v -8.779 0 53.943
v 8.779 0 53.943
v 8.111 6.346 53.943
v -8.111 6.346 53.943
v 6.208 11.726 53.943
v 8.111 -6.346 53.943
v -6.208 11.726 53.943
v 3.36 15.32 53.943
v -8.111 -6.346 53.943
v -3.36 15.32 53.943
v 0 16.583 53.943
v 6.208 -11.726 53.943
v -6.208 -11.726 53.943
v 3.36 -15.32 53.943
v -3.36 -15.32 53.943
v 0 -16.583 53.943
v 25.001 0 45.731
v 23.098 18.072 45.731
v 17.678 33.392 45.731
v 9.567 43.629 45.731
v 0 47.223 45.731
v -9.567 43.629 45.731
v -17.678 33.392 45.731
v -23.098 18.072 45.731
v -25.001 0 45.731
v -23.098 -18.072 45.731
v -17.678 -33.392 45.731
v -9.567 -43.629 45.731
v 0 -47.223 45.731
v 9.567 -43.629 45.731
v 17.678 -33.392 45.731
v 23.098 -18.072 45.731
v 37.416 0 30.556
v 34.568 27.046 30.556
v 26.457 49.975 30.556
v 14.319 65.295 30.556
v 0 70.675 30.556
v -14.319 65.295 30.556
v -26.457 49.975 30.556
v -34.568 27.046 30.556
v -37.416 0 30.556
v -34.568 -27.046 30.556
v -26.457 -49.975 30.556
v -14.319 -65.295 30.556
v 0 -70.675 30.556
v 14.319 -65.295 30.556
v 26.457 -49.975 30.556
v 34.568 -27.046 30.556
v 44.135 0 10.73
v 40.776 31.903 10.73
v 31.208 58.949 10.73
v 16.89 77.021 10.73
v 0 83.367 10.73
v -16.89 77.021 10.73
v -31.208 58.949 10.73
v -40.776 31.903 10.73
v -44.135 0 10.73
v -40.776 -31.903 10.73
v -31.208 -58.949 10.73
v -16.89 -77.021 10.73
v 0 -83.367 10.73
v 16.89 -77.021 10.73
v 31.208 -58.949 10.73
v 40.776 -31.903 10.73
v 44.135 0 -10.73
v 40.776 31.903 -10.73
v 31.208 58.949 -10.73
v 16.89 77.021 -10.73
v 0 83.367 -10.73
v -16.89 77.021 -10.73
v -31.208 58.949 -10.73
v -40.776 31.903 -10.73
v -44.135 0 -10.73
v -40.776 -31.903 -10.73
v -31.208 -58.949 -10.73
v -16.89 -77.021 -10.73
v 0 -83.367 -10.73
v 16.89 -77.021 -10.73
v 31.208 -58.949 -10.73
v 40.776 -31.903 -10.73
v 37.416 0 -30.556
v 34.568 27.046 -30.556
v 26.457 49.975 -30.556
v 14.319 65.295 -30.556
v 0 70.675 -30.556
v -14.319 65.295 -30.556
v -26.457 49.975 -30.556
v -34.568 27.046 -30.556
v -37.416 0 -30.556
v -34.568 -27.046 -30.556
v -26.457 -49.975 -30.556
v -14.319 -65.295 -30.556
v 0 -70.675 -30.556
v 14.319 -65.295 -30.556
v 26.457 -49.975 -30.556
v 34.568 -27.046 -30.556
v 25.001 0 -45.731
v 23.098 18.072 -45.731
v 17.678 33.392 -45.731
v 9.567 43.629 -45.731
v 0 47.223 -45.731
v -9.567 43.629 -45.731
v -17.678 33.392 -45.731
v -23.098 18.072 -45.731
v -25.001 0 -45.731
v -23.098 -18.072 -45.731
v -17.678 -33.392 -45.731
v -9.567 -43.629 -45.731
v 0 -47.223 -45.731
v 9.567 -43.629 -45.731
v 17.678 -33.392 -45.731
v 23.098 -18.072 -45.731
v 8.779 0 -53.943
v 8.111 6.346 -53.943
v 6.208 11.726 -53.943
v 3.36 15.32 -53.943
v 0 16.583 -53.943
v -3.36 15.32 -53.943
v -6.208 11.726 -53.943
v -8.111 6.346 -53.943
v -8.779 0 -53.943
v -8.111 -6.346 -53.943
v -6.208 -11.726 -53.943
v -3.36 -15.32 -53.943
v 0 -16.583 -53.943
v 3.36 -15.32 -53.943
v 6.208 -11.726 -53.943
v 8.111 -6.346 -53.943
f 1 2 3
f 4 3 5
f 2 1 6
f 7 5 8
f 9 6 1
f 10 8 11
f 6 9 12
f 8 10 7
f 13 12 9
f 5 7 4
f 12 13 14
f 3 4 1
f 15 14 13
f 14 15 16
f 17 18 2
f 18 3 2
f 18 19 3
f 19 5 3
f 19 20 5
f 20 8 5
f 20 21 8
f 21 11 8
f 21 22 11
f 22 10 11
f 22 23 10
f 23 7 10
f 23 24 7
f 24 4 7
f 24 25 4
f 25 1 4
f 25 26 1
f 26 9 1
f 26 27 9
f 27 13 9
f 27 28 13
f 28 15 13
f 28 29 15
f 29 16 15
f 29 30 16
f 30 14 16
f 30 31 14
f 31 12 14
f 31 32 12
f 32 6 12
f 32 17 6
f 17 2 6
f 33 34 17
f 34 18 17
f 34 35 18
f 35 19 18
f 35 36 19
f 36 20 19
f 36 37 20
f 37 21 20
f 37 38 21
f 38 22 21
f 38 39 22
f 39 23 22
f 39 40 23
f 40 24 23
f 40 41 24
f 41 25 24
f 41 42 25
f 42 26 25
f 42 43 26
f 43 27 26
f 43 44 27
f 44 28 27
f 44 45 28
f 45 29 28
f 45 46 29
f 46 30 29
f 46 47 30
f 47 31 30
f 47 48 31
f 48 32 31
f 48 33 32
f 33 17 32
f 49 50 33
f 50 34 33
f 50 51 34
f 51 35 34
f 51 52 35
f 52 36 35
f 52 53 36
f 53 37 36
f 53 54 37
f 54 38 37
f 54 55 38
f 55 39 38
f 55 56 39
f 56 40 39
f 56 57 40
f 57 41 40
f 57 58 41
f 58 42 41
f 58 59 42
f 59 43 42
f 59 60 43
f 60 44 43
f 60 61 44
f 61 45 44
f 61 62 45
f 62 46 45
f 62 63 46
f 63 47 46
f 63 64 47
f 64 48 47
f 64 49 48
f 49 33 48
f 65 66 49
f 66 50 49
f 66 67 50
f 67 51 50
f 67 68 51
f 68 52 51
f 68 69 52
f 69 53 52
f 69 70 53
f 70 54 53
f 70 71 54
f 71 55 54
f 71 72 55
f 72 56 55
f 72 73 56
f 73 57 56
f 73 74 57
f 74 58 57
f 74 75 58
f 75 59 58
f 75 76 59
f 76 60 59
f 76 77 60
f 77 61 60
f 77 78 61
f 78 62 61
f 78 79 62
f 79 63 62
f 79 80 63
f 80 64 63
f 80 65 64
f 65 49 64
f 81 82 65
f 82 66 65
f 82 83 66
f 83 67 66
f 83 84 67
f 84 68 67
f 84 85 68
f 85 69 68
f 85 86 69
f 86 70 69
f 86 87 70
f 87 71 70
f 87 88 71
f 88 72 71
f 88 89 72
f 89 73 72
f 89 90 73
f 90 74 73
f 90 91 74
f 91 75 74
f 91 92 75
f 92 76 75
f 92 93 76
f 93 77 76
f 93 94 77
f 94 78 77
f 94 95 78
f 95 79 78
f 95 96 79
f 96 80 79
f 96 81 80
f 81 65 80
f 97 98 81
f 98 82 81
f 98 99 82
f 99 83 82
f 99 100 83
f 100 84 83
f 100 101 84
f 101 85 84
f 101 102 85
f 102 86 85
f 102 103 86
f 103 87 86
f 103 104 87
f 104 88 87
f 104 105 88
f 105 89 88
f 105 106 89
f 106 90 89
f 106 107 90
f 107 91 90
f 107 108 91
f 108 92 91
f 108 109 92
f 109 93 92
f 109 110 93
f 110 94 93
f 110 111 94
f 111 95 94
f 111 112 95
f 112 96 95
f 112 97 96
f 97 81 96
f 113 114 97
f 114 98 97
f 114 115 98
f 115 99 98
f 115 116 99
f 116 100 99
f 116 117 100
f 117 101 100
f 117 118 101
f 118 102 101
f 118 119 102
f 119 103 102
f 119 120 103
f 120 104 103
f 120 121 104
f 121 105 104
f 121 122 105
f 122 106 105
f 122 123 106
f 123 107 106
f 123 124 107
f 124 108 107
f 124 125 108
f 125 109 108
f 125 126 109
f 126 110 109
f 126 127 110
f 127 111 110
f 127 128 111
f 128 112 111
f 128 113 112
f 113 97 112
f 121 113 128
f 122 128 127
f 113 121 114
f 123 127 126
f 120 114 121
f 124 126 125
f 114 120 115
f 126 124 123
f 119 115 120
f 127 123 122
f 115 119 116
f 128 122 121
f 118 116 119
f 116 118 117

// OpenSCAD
// Generated by SolidPython 1.0.1 on 2020-07-29 00:46:49


scale(v = [9, 17, 11]) {
	sphere(r = 5);
}
/***********************************************
*********      SolidPython code:      **********
************************************************
 
# import packages: SolidPython
from solid import *
from solid.utils import *
from itertools import chain, combinations, permutations


class Resize:

    def __init__(self, scad_file):
        self.scad_file = scad_file
        #self.scad_file = import_scad(scad_file)
        # cone/cylinder param:
        self.r1 = 0
        self.r2 = 0
        self.h = 0
        # rectangular prism param:
        self.w = 0
        self.l = 0
        # ellipse param:
        self.r = 0

    # import OpenScad code (file name corresponds to shape)


    # classify shape + parameters
    def assign(self, param1, param2, param3):
        if self.scad_file == 'cone.scad':
            self.r1 = param1
            self.r2 = param2
            self.h = param3
        elif self.scad_file == 'cylinder.scad':
            self.r1 = param1
            self.r2 = param2
            self.h = param3
        elif self.scad_file == 'rectangularPrism.scad':
            self.h = param1
            self.l = param2
            self.w = param3
        else:
            self.r = param1
            self.h = param2

    # resize parameters
    def iterate(self):
        x = range(3, 20, 2)
        i = 1
        if self.scad_file == 'cone.scad':
            tempList = list(permutations(x, 2))
            for temp in tempList:
                param1 = temp[0]
                param2 = temp[1]
                filepath = 'produced_scad_files/' + 'cone' + str(param1) + '_' + str(param2) + '_' + '.scad'
                scad_render_to_file(cylinder(h=param1, r1=param2, r2=0), filepath)

        elif self.scad_file == 'cylinder.scad':
            tempList = list(permutations(x, 3))
            for temp in tempList:
                param1 = temp[0]
                param2 = temp[1]
                filepath = 'produced_scad_files/' + 'cylinder' + str(param1) + '_' + str(param2) + '_' + '.scad'
                scad_render_to_file(cylinder(h=param1, r1=param2, r2=param2), filepath)

        elif self.scad_file == 'rectangularPrism.scad':
            tempList = list(permutations(x, 3))
            for temp in tempList:
                param1 = temp[0]
                param2 = temp[1]
                param3 = temp[2]
                filepath = 'produced_scad_files/' + 'rectangularPrism' + str(param1) + '_' + str(param2) + '_' + str(
                    param3) + '.scad'
                scad_render_to_file(cube(size=(param1, param2, param3)), filepath)

        elif self.scad_file == 'ellipse.scad':
            tempList = list(permutations(x, 4))
            for temp in tempList:
                param1 = temp[0]
                param2 = temp[1]
                param3 = temp[2]
                param4 = temp[3]
                filepath = 'produced_scad_files/' + 'ellipse' + str(param1) + '_' + str(param2) + '_' + str(param3) + '_' + str(param4) + '.scad'
                scad_render_to_file(scale([param1, param2, param3])(sphere(r=param4)), filepath)

    def render_to_scadfile(self):
        scad_render_to_file(scad, 'example.scad') 
 
************************************************/
